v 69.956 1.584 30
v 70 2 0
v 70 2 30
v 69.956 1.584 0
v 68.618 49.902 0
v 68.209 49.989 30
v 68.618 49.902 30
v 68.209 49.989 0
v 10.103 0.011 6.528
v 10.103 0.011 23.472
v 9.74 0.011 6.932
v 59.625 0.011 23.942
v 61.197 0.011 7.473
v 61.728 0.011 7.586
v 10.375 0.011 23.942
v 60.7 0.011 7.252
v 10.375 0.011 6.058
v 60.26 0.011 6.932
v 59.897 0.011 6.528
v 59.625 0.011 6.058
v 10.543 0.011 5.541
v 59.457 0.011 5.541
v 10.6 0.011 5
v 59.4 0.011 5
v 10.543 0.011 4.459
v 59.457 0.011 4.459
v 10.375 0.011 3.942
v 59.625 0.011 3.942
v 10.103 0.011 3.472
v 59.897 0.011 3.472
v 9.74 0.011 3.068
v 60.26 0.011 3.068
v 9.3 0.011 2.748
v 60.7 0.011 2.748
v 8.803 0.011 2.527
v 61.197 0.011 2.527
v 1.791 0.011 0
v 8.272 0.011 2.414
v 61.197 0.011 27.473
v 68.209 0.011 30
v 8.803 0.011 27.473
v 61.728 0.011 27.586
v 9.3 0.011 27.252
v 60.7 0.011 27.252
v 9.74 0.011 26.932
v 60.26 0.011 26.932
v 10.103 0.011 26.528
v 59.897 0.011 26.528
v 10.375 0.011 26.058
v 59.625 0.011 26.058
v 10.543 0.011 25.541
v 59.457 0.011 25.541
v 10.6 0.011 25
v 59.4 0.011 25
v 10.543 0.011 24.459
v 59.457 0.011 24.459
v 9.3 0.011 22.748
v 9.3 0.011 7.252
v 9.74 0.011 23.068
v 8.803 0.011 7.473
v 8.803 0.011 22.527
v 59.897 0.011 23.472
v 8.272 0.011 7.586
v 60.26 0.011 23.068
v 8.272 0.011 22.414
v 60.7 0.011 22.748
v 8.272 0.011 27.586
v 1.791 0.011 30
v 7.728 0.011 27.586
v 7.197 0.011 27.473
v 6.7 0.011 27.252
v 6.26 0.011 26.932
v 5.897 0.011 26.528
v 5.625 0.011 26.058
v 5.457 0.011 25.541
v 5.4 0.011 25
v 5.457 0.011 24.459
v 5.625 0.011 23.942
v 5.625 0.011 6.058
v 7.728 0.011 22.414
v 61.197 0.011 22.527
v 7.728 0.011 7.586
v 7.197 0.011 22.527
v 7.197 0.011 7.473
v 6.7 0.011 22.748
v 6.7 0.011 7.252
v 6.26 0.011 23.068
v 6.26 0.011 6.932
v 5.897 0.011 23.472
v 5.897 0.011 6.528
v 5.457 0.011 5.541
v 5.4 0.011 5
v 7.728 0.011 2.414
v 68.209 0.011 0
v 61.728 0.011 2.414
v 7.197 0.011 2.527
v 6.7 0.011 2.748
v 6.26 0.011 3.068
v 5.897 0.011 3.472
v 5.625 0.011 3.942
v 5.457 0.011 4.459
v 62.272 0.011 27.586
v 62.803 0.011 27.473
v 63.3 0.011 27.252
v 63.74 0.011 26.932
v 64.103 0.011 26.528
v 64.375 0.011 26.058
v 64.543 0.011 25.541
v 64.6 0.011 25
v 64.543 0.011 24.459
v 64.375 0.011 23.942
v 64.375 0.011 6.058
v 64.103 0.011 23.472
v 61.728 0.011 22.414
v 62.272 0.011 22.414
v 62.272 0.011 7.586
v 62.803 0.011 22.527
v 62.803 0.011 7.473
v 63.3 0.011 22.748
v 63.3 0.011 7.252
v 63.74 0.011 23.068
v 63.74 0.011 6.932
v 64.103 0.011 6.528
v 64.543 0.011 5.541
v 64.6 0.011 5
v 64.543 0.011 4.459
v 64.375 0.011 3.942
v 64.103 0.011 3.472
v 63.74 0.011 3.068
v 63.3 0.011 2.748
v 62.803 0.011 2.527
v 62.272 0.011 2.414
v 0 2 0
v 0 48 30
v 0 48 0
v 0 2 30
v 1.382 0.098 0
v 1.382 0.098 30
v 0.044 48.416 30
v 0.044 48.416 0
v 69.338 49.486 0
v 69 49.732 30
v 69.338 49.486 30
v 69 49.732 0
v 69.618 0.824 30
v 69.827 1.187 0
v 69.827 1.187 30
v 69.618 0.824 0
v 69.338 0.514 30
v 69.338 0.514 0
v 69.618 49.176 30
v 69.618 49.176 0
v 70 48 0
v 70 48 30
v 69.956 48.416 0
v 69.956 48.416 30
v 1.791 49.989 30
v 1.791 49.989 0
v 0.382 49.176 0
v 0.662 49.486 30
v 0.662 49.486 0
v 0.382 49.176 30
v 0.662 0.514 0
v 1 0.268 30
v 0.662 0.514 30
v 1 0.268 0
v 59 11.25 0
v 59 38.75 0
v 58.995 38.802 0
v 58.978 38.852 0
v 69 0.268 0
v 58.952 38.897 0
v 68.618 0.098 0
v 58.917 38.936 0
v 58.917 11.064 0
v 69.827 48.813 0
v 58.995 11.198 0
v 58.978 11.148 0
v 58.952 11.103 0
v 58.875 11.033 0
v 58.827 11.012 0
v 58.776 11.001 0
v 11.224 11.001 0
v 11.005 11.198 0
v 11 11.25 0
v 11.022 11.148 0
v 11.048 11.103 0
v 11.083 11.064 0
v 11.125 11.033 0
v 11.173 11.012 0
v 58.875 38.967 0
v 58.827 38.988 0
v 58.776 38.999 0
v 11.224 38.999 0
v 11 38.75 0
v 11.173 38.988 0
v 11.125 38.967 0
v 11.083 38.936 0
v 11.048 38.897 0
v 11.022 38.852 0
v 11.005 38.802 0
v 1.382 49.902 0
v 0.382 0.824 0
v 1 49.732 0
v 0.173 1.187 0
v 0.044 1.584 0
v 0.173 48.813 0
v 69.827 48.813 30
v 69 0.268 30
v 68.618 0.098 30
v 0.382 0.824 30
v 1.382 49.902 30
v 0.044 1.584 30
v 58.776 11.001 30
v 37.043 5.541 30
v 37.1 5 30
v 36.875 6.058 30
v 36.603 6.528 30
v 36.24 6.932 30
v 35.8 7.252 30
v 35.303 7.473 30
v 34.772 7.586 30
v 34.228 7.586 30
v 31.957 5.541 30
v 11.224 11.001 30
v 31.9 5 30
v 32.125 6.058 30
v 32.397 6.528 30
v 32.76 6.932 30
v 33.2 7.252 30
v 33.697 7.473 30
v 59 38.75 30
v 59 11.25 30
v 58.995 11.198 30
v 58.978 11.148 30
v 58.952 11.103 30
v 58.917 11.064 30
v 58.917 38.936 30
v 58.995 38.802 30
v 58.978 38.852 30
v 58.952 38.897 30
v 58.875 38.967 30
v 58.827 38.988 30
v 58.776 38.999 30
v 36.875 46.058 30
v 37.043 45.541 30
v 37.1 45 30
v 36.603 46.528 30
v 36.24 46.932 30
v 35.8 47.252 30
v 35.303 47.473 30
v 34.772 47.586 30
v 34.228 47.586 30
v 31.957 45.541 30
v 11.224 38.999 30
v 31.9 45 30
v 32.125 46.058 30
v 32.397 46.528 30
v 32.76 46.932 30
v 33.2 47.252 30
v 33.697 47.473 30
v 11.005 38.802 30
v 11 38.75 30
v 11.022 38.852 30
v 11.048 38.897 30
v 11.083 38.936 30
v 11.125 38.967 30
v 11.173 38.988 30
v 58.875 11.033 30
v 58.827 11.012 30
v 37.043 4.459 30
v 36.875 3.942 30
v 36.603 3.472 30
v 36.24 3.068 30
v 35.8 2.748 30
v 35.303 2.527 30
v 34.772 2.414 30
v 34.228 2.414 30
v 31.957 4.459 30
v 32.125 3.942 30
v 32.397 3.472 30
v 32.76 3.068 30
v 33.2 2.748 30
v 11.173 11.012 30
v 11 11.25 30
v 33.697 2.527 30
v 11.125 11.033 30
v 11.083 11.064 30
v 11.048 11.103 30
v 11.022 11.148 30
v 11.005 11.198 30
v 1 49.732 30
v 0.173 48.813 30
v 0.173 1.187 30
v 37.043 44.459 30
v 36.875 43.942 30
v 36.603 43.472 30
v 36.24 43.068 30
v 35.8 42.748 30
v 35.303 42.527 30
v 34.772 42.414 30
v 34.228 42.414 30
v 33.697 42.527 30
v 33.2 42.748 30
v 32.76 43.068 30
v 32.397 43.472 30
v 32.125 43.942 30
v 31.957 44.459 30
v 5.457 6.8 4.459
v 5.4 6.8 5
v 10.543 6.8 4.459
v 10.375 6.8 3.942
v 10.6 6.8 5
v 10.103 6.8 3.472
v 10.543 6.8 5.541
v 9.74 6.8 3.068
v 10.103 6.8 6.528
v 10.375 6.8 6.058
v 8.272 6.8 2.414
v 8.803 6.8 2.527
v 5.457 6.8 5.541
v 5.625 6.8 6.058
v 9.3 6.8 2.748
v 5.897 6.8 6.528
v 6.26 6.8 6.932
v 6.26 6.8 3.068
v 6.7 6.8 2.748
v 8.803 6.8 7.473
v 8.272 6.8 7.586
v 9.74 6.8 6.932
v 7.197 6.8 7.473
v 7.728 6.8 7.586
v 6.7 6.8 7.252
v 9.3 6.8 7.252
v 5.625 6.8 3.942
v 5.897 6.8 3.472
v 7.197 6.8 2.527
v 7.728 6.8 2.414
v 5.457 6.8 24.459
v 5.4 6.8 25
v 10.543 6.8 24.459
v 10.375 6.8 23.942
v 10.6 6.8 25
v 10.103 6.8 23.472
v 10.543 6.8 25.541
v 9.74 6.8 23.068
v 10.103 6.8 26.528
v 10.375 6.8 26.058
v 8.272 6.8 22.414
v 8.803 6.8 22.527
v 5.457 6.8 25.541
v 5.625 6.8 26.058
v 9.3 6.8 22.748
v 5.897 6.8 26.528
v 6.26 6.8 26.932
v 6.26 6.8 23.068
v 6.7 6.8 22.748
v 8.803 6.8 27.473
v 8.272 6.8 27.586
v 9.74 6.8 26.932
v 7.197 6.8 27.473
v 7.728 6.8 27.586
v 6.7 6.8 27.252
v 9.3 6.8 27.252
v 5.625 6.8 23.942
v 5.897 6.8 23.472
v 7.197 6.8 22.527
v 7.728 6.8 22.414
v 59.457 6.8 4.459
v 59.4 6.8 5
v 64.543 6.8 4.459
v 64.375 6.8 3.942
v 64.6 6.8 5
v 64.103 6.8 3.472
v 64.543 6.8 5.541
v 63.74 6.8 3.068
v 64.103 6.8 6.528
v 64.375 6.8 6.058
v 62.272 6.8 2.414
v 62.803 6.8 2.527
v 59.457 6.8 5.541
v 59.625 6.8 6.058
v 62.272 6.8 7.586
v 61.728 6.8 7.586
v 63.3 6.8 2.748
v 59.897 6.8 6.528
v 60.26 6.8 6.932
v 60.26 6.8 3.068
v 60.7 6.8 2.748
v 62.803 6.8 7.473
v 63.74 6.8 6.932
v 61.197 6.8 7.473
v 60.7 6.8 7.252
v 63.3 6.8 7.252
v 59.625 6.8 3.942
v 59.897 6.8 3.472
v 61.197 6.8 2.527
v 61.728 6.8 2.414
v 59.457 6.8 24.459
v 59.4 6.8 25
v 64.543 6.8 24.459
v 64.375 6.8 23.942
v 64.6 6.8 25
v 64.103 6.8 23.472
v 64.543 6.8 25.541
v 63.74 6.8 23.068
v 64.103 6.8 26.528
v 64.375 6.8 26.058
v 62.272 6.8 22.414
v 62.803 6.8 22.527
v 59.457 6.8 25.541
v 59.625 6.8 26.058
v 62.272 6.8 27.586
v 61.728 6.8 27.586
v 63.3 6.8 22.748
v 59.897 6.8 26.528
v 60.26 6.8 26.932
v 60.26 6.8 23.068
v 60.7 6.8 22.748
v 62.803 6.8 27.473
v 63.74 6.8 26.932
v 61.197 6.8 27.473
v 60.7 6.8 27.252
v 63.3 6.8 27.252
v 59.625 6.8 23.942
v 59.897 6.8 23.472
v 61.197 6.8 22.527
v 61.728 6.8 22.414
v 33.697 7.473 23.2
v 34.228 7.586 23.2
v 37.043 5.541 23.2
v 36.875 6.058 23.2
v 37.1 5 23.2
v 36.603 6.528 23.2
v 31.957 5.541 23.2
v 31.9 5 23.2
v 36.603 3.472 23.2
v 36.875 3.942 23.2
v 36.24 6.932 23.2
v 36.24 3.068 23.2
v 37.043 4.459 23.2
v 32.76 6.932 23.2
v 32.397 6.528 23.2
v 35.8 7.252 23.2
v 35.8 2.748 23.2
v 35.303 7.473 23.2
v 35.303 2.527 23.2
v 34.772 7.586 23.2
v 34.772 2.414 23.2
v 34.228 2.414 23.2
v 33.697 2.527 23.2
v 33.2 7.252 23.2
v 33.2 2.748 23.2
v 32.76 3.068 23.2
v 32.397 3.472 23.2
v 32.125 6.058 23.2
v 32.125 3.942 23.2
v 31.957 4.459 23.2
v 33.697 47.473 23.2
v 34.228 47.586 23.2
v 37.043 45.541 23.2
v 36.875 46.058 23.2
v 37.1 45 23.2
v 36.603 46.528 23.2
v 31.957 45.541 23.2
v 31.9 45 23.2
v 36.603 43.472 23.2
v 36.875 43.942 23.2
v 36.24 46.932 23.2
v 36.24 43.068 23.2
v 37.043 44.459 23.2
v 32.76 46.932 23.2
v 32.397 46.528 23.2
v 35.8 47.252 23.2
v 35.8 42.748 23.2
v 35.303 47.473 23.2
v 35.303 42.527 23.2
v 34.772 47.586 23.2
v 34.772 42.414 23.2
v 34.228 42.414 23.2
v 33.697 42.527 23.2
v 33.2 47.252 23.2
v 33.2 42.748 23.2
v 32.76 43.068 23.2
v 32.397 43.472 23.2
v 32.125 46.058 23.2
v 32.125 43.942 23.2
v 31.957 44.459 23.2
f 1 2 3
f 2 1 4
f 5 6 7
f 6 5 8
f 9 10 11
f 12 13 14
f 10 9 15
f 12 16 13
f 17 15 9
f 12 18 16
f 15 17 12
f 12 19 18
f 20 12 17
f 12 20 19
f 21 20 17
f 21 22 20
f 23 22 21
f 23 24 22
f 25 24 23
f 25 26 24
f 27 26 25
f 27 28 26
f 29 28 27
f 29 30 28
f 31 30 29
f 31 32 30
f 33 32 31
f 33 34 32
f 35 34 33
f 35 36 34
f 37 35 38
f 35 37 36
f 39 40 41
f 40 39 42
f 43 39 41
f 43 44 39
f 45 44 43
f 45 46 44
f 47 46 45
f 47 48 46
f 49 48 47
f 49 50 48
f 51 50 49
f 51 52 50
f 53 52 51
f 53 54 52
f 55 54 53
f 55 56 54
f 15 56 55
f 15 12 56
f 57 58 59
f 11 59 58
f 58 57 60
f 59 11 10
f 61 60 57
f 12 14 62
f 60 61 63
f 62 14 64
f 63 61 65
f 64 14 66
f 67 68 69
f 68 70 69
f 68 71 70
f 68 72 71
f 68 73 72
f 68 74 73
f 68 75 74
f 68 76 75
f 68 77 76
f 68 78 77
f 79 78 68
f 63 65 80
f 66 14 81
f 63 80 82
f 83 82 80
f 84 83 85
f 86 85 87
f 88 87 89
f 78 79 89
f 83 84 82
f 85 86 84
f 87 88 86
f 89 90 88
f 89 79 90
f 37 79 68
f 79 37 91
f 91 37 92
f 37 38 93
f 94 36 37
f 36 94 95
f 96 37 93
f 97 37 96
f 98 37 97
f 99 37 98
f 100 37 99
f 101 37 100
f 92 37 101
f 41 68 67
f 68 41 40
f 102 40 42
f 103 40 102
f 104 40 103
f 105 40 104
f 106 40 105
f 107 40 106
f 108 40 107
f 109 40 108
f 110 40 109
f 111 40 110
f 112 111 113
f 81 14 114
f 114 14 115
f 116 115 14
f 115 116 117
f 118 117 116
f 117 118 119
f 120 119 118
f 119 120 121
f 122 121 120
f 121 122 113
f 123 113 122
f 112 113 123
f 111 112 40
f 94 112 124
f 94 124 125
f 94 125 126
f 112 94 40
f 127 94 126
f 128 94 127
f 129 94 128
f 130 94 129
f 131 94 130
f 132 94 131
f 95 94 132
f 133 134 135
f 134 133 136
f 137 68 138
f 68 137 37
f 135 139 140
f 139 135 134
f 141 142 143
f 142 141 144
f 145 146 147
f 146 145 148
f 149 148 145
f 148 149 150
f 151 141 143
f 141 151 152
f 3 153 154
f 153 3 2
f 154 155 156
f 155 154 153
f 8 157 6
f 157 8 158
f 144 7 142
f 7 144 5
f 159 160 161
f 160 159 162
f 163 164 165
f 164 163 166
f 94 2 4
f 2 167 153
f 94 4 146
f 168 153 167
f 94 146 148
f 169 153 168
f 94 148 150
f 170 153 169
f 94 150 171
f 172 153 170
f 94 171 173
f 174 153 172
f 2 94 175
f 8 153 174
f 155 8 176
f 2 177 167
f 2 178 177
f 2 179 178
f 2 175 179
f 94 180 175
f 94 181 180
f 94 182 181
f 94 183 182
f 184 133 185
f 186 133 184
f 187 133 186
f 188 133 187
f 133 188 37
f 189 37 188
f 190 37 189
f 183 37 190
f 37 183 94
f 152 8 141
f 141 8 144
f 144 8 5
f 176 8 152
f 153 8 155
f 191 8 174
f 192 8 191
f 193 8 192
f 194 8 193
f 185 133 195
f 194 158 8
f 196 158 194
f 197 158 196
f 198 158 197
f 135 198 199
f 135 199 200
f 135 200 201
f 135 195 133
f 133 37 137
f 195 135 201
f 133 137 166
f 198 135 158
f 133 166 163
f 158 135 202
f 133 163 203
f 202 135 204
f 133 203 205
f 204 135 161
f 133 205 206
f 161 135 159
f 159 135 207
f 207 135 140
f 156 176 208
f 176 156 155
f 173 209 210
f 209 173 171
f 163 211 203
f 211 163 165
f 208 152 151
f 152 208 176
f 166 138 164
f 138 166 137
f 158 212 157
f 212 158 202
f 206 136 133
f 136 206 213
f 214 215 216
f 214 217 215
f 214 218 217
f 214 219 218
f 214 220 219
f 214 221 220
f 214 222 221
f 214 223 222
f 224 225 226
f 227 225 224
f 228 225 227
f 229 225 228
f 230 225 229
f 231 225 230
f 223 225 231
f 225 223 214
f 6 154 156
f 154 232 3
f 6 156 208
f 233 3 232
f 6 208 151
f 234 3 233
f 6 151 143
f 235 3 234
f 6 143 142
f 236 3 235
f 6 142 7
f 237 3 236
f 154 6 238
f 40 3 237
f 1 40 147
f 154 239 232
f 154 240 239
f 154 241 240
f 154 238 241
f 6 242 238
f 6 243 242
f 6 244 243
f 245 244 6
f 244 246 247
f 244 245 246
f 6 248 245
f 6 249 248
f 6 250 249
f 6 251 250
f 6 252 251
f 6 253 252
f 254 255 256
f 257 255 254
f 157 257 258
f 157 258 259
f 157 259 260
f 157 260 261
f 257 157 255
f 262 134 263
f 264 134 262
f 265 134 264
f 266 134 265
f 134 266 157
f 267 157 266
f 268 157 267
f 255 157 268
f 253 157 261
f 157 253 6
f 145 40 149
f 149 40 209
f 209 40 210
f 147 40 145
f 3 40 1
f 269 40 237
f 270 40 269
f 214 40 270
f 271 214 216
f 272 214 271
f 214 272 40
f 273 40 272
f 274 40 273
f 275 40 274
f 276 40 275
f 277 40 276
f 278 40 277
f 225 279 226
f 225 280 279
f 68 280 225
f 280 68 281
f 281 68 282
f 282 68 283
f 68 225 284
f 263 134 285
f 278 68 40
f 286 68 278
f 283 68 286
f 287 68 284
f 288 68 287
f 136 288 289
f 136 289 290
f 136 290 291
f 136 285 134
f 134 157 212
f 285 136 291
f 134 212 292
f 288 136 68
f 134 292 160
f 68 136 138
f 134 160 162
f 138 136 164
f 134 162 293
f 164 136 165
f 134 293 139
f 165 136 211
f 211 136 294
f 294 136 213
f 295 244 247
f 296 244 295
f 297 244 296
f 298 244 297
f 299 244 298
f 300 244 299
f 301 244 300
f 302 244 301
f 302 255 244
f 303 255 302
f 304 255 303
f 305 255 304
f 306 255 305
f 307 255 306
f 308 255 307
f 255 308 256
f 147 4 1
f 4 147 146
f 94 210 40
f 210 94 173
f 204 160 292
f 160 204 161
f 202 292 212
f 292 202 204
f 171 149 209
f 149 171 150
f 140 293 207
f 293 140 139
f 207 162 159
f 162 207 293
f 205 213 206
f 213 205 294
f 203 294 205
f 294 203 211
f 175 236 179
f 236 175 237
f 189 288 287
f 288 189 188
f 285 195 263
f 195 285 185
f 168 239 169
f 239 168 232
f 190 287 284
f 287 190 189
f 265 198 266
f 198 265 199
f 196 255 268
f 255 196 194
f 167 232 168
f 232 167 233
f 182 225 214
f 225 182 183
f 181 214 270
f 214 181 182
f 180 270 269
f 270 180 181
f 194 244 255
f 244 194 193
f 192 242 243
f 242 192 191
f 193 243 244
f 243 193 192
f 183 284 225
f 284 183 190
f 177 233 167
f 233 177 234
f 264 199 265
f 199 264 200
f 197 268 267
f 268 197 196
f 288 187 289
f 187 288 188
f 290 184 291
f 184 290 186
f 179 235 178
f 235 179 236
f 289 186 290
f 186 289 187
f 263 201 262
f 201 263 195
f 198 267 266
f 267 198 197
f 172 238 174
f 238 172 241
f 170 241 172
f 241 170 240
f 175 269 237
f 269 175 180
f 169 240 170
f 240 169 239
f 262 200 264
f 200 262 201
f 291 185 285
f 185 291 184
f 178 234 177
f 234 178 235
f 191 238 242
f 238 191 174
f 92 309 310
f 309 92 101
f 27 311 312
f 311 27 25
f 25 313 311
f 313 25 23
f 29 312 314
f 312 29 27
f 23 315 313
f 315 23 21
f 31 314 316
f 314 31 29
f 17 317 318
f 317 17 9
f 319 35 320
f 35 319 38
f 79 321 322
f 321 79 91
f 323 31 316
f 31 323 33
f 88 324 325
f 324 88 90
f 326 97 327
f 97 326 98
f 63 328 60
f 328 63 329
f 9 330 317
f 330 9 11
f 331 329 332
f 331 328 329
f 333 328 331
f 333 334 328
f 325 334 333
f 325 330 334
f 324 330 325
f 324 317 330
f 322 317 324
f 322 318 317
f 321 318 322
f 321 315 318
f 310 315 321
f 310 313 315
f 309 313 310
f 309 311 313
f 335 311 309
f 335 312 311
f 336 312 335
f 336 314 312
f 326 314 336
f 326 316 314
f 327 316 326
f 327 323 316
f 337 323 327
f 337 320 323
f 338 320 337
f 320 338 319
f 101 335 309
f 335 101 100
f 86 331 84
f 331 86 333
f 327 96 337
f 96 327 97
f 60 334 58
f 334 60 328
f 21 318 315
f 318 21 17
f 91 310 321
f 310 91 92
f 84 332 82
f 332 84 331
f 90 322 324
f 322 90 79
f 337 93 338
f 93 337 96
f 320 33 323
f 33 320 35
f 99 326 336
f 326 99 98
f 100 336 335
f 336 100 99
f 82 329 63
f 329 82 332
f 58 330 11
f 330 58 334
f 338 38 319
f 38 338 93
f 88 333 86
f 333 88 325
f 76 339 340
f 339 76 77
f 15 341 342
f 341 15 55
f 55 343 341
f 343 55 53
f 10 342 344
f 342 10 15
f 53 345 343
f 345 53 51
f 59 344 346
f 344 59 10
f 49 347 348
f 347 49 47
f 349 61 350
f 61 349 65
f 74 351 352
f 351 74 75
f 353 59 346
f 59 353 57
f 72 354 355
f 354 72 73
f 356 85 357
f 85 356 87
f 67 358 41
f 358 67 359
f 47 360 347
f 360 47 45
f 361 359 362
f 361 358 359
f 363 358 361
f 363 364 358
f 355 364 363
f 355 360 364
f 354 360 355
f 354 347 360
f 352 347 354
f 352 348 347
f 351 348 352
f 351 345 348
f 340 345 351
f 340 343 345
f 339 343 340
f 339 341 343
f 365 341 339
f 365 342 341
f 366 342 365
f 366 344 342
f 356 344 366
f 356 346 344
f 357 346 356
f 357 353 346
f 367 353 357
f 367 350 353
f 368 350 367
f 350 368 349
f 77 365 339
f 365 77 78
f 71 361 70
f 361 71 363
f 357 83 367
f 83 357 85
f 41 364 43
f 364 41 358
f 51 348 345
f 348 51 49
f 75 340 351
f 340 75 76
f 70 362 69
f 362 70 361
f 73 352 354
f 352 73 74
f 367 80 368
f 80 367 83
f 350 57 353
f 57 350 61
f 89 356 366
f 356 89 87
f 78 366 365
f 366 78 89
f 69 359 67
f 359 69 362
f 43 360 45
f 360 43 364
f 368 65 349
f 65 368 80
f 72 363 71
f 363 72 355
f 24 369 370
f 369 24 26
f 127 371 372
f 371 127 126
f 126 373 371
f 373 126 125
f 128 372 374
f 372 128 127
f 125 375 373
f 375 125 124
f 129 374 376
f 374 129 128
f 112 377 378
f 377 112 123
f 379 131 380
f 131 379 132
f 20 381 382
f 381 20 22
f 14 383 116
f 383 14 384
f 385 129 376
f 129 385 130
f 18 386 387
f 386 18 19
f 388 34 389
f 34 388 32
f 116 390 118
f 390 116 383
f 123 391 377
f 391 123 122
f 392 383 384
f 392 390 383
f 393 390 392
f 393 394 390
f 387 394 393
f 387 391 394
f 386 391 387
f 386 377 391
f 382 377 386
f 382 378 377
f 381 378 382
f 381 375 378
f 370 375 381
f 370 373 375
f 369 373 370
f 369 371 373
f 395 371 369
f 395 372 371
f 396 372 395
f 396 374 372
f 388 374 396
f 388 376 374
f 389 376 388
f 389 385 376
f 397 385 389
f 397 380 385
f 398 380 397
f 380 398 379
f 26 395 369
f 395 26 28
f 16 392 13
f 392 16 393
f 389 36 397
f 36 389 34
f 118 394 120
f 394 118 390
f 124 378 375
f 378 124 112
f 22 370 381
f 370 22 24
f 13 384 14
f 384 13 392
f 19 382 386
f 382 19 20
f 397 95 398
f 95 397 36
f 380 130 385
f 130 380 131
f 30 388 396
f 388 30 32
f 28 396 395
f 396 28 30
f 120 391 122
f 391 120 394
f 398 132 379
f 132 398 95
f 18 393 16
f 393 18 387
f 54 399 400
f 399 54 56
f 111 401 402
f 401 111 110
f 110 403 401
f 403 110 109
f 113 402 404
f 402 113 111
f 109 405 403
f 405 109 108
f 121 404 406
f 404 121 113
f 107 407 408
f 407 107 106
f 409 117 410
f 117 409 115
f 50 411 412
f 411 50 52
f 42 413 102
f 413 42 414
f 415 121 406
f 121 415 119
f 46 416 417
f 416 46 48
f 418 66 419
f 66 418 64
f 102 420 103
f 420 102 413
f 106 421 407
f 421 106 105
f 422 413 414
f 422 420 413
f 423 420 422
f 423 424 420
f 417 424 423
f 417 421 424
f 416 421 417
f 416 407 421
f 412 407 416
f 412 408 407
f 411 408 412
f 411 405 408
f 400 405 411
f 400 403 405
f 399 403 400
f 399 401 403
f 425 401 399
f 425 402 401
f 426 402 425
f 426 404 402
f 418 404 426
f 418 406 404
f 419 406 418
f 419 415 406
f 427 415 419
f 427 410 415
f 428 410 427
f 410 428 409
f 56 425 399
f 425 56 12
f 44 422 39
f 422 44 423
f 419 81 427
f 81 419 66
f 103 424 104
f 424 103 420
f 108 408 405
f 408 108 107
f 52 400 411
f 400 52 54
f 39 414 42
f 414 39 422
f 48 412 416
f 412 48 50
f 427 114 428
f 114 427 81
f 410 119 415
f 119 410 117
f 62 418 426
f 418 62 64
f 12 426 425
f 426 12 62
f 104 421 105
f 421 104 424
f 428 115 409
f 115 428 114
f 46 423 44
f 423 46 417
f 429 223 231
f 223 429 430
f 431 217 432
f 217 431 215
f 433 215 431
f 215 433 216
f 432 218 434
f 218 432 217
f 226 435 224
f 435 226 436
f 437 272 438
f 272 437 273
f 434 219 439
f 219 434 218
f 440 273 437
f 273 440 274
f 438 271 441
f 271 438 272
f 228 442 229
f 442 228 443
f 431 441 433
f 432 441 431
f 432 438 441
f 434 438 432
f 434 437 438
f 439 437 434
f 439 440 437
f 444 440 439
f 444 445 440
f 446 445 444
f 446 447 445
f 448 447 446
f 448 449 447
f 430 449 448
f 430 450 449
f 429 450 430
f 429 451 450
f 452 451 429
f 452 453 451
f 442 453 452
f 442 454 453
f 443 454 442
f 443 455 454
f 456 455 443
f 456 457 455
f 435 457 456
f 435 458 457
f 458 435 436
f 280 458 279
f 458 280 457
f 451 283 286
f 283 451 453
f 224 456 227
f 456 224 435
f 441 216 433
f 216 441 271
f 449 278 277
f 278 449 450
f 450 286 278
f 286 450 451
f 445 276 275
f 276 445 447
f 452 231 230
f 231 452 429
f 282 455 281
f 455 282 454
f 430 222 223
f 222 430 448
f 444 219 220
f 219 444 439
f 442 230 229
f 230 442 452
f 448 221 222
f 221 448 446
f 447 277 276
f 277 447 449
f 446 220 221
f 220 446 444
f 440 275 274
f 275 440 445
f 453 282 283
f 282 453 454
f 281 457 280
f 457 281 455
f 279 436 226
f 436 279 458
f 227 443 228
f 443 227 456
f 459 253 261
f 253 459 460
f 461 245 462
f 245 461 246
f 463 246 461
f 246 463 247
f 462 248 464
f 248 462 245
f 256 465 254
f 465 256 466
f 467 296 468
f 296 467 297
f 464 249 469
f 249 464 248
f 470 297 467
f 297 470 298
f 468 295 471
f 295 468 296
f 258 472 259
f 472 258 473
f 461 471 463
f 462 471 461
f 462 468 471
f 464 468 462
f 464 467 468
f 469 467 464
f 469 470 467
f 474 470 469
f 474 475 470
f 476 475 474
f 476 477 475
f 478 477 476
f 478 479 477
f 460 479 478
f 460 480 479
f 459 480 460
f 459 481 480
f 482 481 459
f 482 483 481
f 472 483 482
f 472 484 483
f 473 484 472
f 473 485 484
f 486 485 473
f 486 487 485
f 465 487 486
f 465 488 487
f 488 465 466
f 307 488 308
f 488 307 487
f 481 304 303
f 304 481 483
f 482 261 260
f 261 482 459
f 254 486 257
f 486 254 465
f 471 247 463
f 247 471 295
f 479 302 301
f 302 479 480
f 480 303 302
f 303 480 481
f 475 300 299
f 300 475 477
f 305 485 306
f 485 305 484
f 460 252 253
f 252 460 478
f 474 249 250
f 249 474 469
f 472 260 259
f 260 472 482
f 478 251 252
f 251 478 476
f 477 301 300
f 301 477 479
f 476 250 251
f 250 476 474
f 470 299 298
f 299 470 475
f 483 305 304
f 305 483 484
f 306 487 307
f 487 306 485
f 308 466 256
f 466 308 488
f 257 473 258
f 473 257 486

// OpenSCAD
height=30;
$fn=30;

body();

module cutout() {
   width=48;
   length=28;
   rad=0.25;

   hull() {
      translate([0+rad,0+rad,-1]) cylinder(r=rad,h=height+2);
      translate([0+rad,length-rad,-1]) cylinder(r=rad,h=height+2);
      translate([width-rad,0+rad,-1]) cylinder(r=rad,h=height+2);
      translate([width-rad,length-rad,-1]) cylinder(r=rad,h=height+2);
   }
}

module body() {
   width=70;
   length=50;
   rad=2;

   difference() {
      hull() {
         translate([0+rad,0+rad,0]) cylinder(r=rad,h=height);
         translate([width-rad,0+rad,0]) cylinder(r=rad,h=height);
         translate([width-rad,length-rad,0]) cylinder(r=rad,h=height);
         translate([0+rad,length-rad,0]) cylinder(r=rad,h=height);
      }
      translate([(width-48)/2,(length-28)/2,0]) cutout();

      /* heat set inserts */
      translate([8,-0.1,5]) rotate([-90,0,0]) cylinder (d=5.2, h=6.9);
      translate([8,-0.1,height-5]) rotate([-90,0,0]) cylinder (d=5.2, h=6.9);
      translate([width-8,-0.1,5]) rotate([-90,0,0]) cylinder (d=5.2, h=6.9);
      translate([width-8,-0.1,height-5]) rotate([-90,0,0]) cylinder (d=5.2, h=6.9);

      /* screw holes */
      translate([width/2-0.5,5,height-6.8]) cylinder (d=5.2, h=6.9);
      translate([width/2-0.5,length-5,height-6.8]) cylinder (d=5.2, h=6.9);
      // translate([width/2-0.5,5,height-6.8]) cylinder (d=3.2, h=6.9);
      // translate([width/2-0.5,length-5,height-6.8]) cylinder (d=3.2, h=6.9);
   }
}
